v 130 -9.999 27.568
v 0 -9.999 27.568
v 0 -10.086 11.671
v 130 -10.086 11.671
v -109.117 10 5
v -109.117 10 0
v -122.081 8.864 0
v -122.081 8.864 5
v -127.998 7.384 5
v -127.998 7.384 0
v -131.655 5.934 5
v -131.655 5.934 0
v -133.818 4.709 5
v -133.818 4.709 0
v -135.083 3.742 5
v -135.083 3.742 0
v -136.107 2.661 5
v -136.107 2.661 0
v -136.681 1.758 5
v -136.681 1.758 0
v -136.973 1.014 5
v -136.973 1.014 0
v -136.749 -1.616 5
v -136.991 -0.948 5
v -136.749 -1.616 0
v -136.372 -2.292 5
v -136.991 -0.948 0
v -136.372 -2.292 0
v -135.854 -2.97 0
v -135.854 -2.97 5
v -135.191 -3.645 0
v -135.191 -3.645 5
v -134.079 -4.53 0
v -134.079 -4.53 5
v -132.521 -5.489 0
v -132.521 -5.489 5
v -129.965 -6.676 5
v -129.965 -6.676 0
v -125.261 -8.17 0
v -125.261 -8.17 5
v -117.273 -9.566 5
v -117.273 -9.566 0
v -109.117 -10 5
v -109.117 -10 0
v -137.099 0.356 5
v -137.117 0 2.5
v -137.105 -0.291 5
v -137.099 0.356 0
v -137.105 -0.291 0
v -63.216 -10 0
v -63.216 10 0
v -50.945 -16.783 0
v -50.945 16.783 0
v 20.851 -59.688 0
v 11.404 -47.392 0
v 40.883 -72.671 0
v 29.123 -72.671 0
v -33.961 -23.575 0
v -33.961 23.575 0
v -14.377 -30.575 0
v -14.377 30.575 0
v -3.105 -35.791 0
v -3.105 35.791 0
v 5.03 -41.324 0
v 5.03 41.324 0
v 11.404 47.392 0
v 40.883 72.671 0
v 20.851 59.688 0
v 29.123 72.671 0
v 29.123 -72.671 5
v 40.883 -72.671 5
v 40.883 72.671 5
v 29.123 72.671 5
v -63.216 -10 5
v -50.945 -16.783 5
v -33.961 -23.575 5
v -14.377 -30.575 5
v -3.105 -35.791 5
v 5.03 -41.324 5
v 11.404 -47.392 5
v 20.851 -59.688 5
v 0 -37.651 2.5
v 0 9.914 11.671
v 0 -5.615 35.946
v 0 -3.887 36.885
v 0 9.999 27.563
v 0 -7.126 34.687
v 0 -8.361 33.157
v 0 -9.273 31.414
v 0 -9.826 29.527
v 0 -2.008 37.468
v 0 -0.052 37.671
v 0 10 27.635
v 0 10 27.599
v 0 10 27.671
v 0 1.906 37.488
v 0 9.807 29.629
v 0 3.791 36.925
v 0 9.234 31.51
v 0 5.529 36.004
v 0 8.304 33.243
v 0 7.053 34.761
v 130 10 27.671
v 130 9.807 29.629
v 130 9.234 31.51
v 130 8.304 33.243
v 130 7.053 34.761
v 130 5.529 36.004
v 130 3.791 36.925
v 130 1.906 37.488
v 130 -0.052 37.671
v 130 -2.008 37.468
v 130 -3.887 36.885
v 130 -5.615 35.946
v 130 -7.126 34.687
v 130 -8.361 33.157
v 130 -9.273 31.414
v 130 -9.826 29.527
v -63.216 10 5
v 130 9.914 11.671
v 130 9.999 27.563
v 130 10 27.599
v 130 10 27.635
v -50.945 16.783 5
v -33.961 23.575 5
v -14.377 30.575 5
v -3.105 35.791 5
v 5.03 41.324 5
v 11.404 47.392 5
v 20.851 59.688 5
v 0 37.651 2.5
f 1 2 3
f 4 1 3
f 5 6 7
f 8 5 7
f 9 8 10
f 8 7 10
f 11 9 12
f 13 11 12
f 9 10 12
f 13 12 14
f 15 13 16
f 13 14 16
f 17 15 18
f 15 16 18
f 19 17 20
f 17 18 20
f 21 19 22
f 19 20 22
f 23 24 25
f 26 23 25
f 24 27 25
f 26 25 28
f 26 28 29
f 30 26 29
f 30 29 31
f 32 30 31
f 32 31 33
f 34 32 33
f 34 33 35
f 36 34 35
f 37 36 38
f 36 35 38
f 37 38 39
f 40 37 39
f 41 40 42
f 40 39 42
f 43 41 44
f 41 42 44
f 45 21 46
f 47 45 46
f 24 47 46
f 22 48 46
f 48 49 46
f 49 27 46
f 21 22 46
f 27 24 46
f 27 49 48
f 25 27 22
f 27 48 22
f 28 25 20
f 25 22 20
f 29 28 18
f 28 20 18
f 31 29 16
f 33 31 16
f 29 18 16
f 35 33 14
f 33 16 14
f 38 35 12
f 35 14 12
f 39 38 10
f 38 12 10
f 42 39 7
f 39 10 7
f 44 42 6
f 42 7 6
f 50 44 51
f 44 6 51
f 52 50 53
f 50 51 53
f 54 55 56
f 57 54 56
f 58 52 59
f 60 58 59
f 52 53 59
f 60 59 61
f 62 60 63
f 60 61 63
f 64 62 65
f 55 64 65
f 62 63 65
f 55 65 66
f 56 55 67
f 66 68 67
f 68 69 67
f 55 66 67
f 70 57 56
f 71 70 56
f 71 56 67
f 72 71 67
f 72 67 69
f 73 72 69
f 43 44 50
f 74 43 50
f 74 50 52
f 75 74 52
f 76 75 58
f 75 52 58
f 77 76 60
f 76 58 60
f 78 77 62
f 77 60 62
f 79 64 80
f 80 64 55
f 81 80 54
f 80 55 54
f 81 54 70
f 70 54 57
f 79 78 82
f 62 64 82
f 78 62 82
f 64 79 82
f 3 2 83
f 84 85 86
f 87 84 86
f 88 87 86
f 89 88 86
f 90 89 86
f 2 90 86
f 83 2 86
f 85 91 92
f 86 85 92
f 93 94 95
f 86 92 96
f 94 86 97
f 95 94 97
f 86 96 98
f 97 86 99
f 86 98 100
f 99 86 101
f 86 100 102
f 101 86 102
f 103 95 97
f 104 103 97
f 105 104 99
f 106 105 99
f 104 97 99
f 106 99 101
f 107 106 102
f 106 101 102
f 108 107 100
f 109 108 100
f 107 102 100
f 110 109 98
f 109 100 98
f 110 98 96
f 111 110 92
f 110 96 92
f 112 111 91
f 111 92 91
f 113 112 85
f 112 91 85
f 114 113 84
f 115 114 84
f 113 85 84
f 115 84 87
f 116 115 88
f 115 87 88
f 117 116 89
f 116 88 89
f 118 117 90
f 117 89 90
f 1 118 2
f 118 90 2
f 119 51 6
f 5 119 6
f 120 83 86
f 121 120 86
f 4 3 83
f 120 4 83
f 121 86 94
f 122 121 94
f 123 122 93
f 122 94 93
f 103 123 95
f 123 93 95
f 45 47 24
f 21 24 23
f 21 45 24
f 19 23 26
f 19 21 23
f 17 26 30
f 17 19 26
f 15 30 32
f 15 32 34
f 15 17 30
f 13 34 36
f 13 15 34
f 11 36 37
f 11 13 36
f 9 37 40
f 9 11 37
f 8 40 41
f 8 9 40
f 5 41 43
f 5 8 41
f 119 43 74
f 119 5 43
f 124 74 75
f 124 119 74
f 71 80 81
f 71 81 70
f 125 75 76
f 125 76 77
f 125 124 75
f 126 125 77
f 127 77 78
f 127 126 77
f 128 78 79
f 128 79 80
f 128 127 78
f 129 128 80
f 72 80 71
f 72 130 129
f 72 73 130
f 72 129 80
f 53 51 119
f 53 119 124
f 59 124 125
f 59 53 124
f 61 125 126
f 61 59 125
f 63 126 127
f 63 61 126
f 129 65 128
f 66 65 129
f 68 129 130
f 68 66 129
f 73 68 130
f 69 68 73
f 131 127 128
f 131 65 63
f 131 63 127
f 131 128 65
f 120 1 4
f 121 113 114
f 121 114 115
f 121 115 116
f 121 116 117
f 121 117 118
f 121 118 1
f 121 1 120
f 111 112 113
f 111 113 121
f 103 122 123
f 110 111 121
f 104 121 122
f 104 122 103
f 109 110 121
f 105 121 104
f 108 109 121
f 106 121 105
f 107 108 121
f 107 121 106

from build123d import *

# Parameters (mm, degrees)
F1_DEPTH = 5
F3_DEPTH = 130


# Not quite as in the source:
# - a feature names something its author has since deleted; it is built from what else it names


with BuildPart() as f1:
    # F0 (on Top) → F1 (new body)
    with BuildSketch(Plane.XY):
        with BuildLine():
            Line((40.8830098808, -10), (-63.2155463099, -10))
            add(Edge.make_bspline(
                [(-63.2155463099, -10), (-42.3123203218, -23.7419363111), (4.2183280181, -29.5239745011), (21.0766339926, -60.0394110264), (29.1229858994, -72.6713687181)],
                knots=[0, 0, 0, 0, 0.551730828, 1, 1, 1, 1], degree=3))
            Line((29.1229858994, -72.6713687181), (40.8830098808, -72.6713687181))
            Line((40.8830098808, -72.6713687181), (40.8830098808, -10))
        make_face()
        with BuildLine():
            Line((-63.2155463099, 10), (-109.1169901192, 10))
            add(Edge.make_bspline(
                [(-81.1169901192, 0), (-81.1169901192, 10), (-109.1169901192, 10)],
                knots=[0, 0, 0, 1.5707963268, 1.5707963268, 1.5707963268], degree=2, weights=[1, 0.7071067812, 1]))
            add(Edge.make_bspline(
                [(-109.1169901192, -10), (-81.1169901192, -10), (-81.1169901192, 0)],
                knots=[4.7123889804, 4.7123889804, 4.7123889804, 6.2831853072, 6.2831853072, 6.2831853072], degree=2, weights=[1, 0.7071067812, 1]))
            Line((-109.1169901192, -10), (-63.2155463099, -10))
            Line((-63.2155463099, -10), (40.8830098808, -10))
            Line((40.8830098808, -10), (40.8830098808, 0))
            Line((40.8830098808, 0), (40.8830098808, 10))
            Line((40.8830098808, 10), (-63.2155463099, 10))
        make_face()
        with BuildLine():
            add(Edge.make_bspline(
                [(-63.2155463099, 10), (-42.3123203218, 23.7419363111), (4.2183280181, 29.5239745011), (21.0766339926, 60.0394110264), (29.1229858994, 72.6713687181)],
                knots=[0, 0, 0, 0, 0.551730828, 1, 1, 1, 1], degree=3))
            Line((-63.2155463099, 10), (40.8830098808, 10))
            Line((40.8830098808, 10), (40.8830098808, 72.6713687181))
            Line((40.8830098808, 72.6713687181), (29.1229858994, 72.6713687181))
        make_face()
        with BuildLine():
            add(Edge.make_bspline(
                [(-81.1169901192, 0), (-81.1169901192, 10), (-109.1169901192, 10)],
                knots=[0, 0, 0, 1.5707963268, 1.5707963268, 1.5707963268], degree=2, weights=[1, 0.7071067812, 1]))
            add(Edge.make_bspline(
                [(-109.1169901192, 10), (-137.1169901192, 10), (-137.1169901192, 0)],
                knots=[1.5707963268, 1.5707963268, 1.5707963268, 3.1415926536, 3.1415926536, 3.1415926536], degree=2, weights=[1, 0.7071067812, 1]))
            Line((-137.1169901192, 0), (-81.1169901192, 0))
        make_face()
        with BuildLine():
            add(Edge.make_bspline(
                [(-109.1169901192, -10), (-81.1169901192, -10), (-81.1169901192, 0)],
                knots=[4.7123889804, 4.7123889804, 4.7123889804, 6.2831853072, 6.2831853072, 6.2831853072], degree=2, weights=[1, 0.7071067812, 1]))
            Line((-81.1169901192, 0), (-137.1169901192, 0))
            add(Edge.make_bspline(
                [(-137.1169901192, 0), (-137.1169901192, -10), (-109.1169901192, -10)],
                knots=[3.1415926536, 3.1415926536, 3.1415926536, 4.7123889804, 4.7123889804, 4.7123889804], degree=2, weights=[1, 0.7071067812, 1]))
        make_face()
    extrude(amount=F1_DEPTH)


with BuildPart() as f3:
    # F2 (on Right) → F3 (new body)
    with BuildSketch(Plane.YZ):
        with BuildLine():
            Line((9.9135860801, 11.6713725179), (10, 27.6713725179))
            ThreePointArc((10, 27.6713725179), (0.0517808517, 17.6715065817), (-9.9994637487, 27.5678122029))
            Line((-9.9994637487, 27.5678122029), (-10.0864139199, 11.6713725179))
            Line((-10.0864139199, 11.6713725179), (9.9135860801, 11.6713725179))
        make_face()
        with BuildLine():
            ThreePointArc((-9.9994637487, 27.5678122029), (0.0517808517, 17.6715065817), (10, 27.6713725179))
            ThreePointArc((10, 27.6713725179), (-0.0517808517, 37.6712384542), (-9.9994637487, 27.5678122029))
        make_face()
    extrude(amount=F3_DEPTH)


solid = Compound([f1.part, f3.part])
